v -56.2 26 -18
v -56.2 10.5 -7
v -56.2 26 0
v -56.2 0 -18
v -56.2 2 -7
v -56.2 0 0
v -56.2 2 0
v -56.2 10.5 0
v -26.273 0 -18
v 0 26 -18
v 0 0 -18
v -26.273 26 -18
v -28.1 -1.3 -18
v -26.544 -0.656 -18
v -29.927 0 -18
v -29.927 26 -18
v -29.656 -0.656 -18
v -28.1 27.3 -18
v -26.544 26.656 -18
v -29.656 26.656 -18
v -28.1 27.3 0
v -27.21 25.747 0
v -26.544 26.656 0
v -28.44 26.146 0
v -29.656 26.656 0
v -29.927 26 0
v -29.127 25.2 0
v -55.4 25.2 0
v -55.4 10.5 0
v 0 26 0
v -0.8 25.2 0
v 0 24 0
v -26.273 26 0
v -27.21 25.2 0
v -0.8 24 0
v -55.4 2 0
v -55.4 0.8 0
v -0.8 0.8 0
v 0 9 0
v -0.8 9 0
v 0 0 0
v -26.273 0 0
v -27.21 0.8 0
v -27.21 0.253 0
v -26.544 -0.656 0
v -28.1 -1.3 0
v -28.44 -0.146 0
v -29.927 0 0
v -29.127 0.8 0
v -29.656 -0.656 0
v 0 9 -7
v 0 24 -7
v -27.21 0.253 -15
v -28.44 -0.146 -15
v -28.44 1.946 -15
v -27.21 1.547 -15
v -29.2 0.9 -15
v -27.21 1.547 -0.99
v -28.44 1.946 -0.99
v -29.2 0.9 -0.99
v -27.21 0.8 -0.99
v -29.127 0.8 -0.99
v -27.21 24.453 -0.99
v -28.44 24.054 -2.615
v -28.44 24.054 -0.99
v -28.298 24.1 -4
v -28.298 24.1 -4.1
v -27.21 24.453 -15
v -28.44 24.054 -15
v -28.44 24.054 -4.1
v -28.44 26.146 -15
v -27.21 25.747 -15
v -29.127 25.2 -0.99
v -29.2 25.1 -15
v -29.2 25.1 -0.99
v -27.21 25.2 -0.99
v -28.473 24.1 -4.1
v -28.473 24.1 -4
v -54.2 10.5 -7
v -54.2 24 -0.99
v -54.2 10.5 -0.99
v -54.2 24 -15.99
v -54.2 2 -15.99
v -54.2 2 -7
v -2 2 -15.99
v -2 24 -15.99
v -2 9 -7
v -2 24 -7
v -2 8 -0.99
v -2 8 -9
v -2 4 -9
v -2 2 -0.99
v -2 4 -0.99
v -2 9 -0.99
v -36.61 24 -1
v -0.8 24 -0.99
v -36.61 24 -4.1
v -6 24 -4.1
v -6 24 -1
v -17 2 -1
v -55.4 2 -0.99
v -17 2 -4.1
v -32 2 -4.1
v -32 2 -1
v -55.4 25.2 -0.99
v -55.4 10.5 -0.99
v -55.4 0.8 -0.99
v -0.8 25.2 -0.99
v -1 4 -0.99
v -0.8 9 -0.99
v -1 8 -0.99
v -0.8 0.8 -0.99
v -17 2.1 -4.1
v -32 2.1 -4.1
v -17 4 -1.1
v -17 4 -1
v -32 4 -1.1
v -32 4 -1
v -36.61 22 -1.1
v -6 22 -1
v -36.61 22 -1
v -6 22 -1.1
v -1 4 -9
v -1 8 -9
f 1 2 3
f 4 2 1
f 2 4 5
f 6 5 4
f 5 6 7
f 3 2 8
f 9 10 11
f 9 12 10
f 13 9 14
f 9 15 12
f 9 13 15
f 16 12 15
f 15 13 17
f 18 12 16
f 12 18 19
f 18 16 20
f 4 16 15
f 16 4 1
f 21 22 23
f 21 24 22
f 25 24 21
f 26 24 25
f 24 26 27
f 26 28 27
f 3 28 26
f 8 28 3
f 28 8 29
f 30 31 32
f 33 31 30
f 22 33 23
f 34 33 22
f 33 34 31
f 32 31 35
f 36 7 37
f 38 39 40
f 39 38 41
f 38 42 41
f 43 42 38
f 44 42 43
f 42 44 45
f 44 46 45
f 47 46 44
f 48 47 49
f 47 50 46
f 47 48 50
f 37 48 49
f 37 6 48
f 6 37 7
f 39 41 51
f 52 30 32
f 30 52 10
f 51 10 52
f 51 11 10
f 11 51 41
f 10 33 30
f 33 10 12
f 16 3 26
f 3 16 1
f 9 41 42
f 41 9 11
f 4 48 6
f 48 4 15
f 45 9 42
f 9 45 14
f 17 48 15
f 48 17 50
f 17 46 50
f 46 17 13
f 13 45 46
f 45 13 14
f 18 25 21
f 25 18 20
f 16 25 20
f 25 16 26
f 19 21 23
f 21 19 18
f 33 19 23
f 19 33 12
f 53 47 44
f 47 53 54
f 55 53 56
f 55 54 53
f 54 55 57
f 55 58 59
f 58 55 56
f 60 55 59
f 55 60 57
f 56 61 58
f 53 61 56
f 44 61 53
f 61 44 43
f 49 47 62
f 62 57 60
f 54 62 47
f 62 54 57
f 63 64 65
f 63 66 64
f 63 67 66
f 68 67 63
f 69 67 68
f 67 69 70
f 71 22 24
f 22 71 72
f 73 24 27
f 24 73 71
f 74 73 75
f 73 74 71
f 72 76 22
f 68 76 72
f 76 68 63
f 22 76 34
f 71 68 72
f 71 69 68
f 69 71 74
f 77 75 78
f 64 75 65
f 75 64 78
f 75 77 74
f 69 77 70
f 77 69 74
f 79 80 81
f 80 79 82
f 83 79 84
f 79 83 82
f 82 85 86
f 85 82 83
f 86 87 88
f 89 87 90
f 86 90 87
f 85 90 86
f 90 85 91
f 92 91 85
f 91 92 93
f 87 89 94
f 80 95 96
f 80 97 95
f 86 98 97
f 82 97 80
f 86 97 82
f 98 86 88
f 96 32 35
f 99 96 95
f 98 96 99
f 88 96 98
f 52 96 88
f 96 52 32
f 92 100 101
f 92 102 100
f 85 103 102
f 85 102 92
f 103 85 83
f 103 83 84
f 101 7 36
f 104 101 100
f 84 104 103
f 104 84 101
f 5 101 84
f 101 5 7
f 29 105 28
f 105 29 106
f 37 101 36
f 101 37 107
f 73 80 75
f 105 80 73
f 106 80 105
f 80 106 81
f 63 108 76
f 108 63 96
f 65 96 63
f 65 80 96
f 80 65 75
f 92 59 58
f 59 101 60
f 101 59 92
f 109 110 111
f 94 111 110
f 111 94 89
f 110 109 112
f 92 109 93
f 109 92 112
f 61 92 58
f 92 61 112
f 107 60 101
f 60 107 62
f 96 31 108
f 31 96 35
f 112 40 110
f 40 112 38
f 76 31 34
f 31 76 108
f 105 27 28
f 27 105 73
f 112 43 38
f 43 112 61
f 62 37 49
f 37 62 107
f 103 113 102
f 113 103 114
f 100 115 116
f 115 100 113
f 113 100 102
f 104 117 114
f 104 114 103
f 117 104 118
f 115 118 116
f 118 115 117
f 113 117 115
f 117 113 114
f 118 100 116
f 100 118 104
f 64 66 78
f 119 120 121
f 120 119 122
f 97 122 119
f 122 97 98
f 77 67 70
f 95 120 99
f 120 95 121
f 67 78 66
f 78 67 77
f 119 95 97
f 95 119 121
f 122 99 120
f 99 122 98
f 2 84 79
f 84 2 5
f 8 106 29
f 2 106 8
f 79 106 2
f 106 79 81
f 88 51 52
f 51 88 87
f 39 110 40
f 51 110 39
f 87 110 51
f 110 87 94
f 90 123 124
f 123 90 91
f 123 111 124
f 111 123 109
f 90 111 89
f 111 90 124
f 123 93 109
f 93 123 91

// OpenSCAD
board_dim = [52.2, 22.0];
board_clearence = 2;
board_thick = 1.8;
parts_height = 16;
wall = 2;
board_support_positions = [
    [0, 0],
    [board_dim[0]-10, 0],
    [8, board_dim[1]-wall],
    [board_dim[0]-wall, board_dim[1]-wall],
    [board_dim[0]*(1/3), board_dim[1]/2],
    [board_dim[0]*(2/3), board_dim[1]/2]
];
screw_body_d=2.2;
screw_length=15;

//bottom_base();
rotate([0,180,0]) translate([0,0,0]) top_cover();


module top_cover() {
    difference() {
        union() {
            hollow_cover();
            // board retention
            hull() { // this one has a few components at the top, so just small
                translate([wall+15, wall, wall/2]) cube([15, wall, 0.1]);
                translate([wall+15, wall, wall*2]) cube([15, 0.1, 0.1]);
            }
            hull() { // also few components to work around
                translate([wall+4, board_dim[1], wall/2]) cube([board_dim[0]-(25.4*0.85), wall, 0.1]);
                translate([wall+4, board_dim[1]+wall, wall*2]) cube([board_dim[0]-(25.4*0.85), 0.1, 0.1]);
            }
        }
        // Battery connector
        translate([board_dim[0]+wall,wall,0]) cube([wall, 8.5, 7]);
        // Trap 6V power connector & catch sensor
        translate([0,wall+7,0]) cube([wall, 15, 7]);
        // ADC connector protrusion
        translate([wall/2,wall+2,0]) cube([wall, 4, 9]);
        /*
        // camera connector
        translate([board_dim[0]+wall,6.5+wall,0]) cube([wall/2, 19, 3]);
        // SD card
        translate([0,13,0]) cube([wall, 13, 2]);
        // flood sensor
        translate([0,45+wall,0]) cube([wall, 10, 8]);
        // on/off switch
        translate([0,49+wall,11]) cube([wall, 14.5, 8.9]);
        // pump connector + depth & pressure sensors
        translate([11+wall,board_dim[1]+wall,0]) cube([37.5, wall, 8]);
        // power brick connector
        translate([board_dim[0]+wall,54+wall,0]) cube([wall, 11, 13]);
        // battery connector
        translate([board_dim[0]+wall,45+wall,0]) cube([wall, 10, 8]);
        // HDMI
        translate([7.5,wall/2,0]) cube([15,wall/2,3]);
        // 2x USB
        translate([39,0,0]) cube([9.5,wall,3]);
        translate([51.5,0,0]) cube([9.5,wall,3]);
        
        // Reset button
        translate([25,65,parts_height-0.02]) cylinder(h=wall*2, d=reset_button_d);
          */      
    }
}

module hollow_cover() {
    difference() {
        union() {
            cube([board_dim[0]+wall*2, board_dim[1]+wall*2, parts_height+wall]);
            // Retention screw
            translate([board_dim[0]/2+wall,wall-screw_body_d/2,0])
                cylinder(h=parts_height+wall, d=screw_body_d*2, $fn=8);
            translate([board_dim[0]/2+wall,wall+board_dim[1]+screw_body_d/2,0])
                cylinder(h=parts_height+wall, d=screw_body_d*2, $fn=8);
        }
        translate([board_dim[0]/2+wall,wall-screw_body_d/2,0]) cylinder(h=screw_length, d=screw_body_d);
        translate([board_dim[0]/2+wall,wall+board_dim[1]+screw_body_d/2,0]) cylinder(h=screw_length, d=screw_body_d);
        // space for the board itself
        translate([wall, wall, -0.01]) cube([board_dim[0], board_dim[1], parts_height]);
        // interlocking lip
        difference() {
            translate([wall*0.4, wall*0.4, -0.01]) cube([board_dim[0]+(wall*0.6*2), board_dim[1]+(wall*0.6*2), wall/2]);
        }
    }
}

module bottom_base() {
    difference() {
        union() {
            hollow_base();            
            // Board support
            for (leg = board_support_positions) {
                translate([wall+leg[0], wall+leg[1], wall]) cube([wall, wall, board_clearence]);
            }
        }
        /*
        // screw holes
        for (leg = screw_positions) {
            translate([wall+leg[0], wall+leg[1], board_clearence+wall-leg_screw_l+0.01]) cylinder(h=leg_screw_l, d=leg_screw_d*1.47);
        }
        // 2x USB
        translate([39,0,board_clearence+board_thick+wall/2]) cube([9.5,wall,3]);
        translate([51.5,0,board_clearence+board_thick+wall/2]) cube([9.5,wall,3]);
        */
    }
    
}

module hollow_base() {
    difference() {
        union() {
            cube([board_dim[0]+wall*2, board_dim[1]+wall*2, board_clearence+board_thick+wall/2]);
            // Interlocking lip
            translate([wall*0.6, wall*0.6, board_clearence+board_thick+wall/2]) cube([board_dim[0]+(wall*0.4*2), board_dim[1]+(wall*0.4*2), wall/2]);
            // Retention screw
            translate([board_dim[0]/2+wall,wall-screw_body_d/2,0]) cylinder(h=board_clearence+wall/2+board_thick, d=screw_body_d*2);
            translate([board_dim[0]/2+wall,wall+board_dim[1]+screw_body_d/2,0]) cylinder(h=board_clearence+wall/2+board_thick, d=screw_body_d*2);
        }
        // space for the board itself
        translate([wall, wall, wall+0.01]) cube([board_dim[0], board_dim[1], board_clearence+board_thick+wall]);
        // Retention screw hole
        translate([board_dim[0]/2+wall,wall-screw_body_d/2,-0.01]) cylinder(h=board_clearence*3, d=screw_body_d+1);
        translate([board_dim[0]/2+wall,wall+board_dim[1]+screw_body_d/2,-0.01]) cylinder(h=board_clearence*3, d=screw_body_d+1);
        //translate([board_dim[0]/2+wall,0,-0.01]) cylinder(h=2, d=screw_head_d*1.2);
    }
}
